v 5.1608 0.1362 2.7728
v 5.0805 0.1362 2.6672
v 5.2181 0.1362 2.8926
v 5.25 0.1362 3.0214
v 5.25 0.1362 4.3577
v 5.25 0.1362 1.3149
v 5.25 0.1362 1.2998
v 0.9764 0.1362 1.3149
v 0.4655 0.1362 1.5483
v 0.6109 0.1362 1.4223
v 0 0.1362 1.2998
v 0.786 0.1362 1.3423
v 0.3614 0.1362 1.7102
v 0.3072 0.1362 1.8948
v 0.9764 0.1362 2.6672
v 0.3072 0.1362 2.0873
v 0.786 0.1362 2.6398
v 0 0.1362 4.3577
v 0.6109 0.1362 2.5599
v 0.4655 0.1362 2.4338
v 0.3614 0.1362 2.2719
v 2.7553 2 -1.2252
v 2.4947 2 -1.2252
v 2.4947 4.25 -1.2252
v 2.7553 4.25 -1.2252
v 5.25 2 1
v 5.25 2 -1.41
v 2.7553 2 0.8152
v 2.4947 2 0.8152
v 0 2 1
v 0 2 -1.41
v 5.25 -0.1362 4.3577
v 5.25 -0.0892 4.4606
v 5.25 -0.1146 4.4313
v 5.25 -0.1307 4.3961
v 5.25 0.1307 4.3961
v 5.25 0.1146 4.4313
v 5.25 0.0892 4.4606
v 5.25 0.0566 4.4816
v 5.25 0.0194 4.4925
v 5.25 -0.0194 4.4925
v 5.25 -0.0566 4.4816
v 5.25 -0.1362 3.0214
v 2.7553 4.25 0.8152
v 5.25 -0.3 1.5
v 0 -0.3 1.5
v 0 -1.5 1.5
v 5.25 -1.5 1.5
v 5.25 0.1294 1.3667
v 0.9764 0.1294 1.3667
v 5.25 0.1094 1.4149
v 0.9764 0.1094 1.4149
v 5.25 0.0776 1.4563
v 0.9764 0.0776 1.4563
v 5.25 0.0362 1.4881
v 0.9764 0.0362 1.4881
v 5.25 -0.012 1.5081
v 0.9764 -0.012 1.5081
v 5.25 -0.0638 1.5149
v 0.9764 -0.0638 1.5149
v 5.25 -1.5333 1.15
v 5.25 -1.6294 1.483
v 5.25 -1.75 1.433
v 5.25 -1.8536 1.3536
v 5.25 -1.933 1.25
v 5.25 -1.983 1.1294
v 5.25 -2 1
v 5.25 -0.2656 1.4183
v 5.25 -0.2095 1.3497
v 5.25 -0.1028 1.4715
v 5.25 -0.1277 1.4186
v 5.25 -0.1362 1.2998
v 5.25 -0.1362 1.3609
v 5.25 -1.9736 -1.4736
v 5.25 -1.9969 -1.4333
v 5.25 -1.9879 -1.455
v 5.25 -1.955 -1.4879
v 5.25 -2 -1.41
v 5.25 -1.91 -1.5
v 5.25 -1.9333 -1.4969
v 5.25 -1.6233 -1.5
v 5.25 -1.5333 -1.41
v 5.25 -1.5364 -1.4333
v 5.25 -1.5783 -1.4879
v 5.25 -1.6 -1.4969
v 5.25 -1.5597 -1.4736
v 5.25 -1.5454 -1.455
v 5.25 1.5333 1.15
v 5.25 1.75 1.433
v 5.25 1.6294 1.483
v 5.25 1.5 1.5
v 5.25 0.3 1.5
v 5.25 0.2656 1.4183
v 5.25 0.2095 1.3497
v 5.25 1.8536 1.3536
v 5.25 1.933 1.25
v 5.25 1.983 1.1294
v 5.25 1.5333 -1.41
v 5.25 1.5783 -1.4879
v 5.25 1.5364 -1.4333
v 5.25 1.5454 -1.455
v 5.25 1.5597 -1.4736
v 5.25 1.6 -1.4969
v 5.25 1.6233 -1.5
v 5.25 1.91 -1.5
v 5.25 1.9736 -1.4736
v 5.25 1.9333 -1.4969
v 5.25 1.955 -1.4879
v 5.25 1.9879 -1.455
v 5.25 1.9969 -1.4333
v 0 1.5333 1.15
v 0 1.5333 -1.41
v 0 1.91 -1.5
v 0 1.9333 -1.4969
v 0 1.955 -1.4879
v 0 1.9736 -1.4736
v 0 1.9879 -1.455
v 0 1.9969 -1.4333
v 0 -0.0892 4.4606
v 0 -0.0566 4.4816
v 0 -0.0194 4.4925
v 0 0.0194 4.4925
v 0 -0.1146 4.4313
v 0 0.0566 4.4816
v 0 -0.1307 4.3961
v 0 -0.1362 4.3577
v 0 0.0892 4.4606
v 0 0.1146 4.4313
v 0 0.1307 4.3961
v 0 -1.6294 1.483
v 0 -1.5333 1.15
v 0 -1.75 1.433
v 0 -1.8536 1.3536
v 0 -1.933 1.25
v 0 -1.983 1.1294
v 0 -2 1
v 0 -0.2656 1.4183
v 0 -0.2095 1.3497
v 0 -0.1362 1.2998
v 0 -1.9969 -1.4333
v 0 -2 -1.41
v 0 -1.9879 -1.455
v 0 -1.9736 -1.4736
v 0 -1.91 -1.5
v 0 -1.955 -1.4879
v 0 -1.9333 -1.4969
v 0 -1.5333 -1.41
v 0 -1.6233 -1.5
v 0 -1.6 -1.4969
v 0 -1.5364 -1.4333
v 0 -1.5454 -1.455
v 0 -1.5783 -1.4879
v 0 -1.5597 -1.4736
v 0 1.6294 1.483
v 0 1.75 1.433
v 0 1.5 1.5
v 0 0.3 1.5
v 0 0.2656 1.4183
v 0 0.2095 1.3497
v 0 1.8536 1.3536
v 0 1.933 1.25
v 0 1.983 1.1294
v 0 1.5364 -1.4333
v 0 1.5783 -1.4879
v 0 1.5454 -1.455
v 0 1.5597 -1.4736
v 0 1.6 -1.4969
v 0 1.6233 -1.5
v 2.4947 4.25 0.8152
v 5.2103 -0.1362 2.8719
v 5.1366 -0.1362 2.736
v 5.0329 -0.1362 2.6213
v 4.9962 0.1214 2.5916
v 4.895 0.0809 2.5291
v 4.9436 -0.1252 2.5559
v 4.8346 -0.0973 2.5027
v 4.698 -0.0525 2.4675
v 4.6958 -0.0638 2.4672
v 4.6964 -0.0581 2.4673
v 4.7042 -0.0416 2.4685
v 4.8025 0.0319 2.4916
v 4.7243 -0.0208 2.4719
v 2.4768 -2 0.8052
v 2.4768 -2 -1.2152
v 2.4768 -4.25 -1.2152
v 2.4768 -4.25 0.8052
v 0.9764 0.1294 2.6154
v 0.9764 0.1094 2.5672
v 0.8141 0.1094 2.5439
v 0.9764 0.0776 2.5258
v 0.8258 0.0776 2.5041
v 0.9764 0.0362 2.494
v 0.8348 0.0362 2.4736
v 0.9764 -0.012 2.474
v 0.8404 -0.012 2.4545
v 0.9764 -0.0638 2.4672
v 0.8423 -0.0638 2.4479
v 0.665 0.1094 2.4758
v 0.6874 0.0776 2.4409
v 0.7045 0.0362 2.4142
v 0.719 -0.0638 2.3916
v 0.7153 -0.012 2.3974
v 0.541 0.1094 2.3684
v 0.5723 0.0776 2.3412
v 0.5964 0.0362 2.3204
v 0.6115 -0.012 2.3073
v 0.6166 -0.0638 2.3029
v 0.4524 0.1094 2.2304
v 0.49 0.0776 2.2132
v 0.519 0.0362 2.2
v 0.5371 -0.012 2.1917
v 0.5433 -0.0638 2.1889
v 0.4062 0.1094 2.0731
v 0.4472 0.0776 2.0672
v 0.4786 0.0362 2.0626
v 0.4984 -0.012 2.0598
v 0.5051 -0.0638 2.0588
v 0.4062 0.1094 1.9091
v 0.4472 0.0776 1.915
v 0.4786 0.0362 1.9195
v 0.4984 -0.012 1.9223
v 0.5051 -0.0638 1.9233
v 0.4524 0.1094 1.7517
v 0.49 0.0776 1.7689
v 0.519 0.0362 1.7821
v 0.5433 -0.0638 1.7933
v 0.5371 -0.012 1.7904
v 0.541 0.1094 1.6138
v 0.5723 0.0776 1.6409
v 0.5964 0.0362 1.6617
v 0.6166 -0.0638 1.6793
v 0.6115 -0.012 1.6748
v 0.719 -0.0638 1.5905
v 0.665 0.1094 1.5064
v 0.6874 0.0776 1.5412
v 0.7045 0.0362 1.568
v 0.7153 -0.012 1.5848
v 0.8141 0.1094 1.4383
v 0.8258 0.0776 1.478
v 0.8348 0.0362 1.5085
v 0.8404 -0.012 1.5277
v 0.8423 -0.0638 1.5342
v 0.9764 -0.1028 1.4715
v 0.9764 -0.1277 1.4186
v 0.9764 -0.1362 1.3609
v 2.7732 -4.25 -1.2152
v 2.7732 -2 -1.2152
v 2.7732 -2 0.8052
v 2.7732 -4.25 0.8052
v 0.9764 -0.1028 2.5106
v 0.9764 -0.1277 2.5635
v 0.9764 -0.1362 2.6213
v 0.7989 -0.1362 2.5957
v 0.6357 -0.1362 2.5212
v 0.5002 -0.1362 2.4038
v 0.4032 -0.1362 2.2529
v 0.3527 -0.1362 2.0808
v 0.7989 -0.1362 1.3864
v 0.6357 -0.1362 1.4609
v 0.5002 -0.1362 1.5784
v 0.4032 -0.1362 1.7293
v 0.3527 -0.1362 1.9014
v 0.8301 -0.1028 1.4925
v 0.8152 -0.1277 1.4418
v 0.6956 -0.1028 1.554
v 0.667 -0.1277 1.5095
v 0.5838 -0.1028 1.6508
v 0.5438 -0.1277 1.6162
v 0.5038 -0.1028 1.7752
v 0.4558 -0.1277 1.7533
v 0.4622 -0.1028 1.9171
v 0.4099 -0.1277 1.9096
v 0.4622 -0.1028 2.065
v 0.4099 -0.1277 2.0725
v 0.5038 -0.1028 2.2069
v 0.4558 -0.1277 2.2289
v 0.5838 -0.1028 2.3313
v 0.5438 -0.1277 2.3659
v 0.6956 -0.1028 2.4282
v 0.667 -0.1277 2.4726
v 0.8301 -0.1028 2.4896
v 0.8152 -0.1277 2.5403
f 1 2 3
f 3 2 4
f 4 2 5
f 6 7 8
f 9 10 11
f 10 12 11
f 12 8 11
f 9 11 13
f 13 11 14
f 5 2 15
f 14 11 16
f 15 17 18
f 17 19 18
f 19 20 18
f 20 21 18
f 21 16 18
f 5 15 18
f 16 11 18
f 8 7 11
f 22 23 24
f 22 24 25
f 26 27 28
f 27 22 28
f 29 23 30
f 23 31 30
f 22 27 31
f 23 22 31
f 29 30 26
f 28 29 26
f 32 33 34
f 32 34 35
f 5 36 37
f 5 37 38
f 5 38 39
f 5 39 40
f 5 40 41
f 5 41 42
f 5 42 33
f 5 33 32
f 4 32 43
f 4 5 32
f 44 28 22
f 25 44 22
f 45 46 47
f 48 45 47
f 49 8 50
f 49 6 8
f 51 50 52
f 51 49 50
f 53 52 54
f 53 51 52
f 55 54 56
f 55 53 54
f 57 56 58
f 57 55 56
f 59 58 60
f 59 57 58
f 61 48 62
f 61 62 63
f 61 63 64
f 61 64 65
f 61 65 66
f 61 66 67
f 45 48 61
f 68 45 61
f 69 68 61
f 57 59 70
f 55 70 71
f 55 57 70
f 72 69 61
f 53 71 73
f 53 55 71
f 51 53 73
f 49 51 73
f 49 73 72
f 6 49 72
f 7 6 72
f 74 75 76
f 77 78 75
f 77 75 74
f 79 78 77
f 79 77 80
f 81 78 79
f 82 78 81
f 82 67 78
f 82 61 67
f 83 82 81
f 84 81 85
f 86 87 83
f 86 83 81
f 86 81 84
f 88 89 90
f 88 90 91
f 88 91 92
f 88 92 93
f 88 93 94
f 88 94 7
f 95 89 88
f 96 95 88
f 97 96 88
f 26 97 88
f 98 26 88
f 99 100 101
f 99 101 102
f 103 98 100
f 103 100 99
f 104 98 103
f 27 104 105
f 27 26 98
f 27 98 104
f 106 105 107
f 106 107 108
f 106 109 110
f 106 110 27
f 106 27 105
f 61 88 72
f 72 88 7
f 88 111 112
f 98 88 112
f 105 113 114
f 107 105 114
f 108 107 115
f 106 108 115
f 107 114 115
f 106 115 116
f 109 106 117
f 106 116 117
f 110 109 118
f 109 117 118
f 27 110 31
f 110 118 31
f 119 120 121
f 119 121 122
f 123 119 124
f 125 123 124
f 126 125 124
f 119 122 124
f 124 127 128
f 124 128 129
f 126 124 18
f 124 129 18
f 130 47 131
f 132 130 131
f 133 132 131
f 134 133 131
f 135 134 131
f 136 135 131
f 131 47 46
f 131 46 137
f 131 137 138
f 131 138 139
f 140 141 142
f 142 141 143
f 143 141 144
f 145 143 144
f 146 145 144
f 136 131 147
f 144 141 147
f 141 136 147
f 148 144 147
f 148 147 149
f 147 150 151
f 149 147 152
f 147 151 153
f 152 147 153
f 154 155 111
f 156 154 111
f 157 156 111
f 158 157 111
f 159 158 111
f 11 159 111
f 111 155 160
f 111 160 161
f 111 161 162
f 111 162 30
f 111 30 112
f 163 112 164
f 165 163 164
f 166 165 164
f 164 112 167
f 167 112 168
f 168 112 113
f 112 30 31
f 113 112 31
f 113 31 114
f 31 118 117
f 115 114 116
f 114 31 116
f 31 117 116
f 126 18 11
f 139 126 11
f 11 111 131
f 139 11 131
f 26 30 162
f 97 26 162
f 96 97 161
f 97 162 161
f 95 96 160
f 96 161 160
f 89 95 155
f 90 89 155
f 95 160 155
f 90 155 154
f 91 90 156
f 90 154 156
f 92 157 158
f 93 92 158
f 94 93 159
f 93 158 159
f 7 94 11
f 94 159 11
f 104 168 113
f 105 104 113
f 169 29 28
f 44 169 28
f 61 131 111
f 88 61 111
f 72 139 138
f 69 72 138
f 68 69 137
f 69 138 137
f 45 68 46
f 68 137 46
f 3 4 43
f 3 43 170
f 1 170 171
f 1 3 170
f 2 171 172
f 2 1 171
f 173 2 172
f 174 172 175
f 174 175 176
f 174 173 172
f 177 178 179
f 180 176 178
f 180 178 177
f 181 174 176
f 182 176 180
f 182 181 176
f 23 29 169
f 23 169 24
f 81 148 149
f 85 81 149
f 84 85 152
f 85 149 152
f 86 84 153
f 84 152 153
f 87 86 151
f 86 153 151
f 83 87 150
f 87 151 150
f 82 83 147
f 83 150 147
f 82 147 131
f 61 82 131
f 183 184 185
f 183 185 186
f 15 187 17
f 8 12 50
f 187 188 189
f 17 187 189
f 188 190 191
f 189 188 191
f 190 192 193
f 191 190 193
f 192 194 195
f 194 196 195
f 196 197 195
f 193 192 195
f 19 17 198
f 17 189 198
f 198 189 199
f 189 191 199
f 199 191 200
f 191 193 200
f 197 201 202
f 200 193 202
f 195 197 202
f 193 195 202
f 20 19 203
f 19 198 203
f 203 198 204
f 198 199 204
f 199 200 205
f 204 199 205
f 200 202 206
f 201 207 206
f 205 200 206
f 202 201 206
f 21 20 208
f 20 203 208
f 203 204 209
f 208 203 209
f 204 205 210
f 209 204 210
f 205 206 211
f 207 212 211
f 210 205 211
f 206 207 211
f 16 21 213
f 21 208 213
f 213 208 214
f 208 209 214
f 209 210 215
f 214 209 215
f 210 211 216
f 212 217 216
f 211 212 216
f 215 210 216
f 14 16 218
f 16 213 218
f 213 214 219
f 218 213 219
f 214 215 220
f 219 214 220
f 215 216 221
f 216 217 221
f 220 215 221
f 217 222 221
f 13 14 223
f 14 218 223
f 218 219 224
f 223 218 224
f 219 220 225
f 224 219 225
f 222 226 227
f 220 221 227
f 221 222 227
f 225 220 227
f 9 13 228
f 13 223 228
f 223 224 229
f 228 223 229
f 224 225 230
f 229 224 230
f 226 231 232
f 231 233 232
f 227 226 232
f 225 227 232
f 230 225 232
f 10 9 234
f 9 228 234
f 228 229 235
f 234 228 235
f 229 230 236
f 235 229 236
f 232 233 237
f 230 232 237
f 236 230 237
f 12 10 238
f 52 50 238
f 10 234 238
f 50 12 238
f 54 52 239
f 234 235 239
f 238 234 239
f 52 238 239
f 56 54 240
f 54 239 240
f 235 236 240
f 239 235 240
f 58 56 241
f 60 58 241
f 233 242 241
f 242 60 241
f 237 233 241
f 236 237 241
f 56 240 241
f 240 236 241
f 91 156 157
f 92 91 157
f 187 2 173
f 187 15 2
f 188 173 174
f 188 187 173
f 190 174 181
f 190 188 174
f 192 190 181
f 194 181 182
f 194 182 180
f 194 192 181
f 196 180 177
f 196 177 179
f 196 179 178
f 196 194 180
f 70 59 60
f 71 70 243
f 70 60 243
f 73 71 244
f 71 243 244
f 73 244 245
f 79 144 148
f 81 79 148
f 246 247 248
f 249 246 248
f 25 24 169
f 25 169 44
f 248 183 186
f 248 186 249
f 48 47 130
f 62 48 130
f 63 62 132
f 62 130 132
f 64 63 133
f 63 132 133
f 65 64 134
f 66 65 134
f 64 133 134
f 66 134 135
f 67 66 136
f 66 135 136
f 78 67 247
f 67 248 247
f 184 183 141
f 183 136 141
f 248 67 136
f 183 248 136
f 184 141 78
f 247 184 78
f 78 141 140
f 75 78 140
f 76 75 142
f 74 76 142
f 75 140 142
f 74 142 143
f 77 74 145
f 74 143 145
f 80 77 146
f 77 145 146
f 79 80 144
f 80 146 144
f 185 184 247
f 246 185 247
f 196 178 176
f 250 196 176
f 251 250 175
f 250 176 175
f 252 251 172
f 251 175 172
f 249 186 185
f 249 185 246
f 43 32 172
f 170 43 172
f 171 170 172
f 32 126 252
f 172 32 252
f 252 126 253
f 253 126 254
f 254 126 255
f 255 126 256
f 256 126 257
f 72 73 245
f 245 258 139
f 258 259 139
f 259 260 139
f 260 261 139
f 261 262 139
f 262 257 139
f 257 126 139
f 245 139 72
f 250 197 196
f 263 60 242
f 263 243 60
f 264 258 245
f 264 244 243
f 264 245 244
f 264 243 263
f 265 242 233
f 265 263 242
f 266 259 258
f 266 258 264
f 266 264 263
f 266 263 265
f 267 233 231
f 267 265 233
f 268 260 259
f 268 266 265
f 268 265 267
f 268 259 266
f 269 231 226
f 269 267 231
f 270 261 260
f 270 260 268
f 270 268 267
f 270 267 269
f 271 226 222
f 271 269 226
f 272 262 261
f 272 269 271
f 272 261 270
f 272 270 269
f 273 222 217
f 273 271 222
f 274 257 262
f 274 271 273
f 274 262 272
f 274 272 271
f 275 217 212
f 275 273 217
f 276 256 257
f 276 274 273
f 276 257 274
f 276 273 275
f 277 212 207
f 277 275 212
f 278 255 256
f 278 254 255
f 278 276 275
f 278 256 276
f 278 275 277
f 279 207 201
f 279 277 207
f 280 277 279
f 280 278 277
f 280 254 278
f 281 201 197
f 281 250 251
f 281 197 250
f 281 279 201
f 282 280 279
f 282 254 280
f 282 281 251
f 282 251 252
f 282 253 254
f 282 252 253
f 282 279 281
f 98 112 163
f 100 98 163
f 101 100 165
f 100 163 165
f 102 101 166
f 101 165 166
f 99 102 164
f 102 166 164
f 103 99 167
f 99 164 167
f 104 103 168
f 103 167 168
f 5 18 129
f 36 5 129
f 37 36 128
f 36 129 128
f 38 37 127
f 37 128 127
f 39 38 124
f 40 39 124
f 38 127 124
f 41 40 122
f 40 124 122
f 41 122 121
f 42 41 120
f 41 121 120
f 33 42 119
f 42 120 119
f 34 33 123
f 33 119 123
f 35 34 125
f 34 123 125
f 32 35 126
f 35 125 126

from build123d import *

# Parameters (mm, degrees)
RESSALTO_EXTRUS_O1_DEPTH = 5.25
CORTE_EXTRUS_O1_DEPTH    = 5.25
CORTE_EXTRUS_O2_DEPTH    = 5.25
FILETE1_R                = 0.2
FILETE2_R                = 0.2
ESBO_O5_W                = 0.260533882
ESBO_O5_H                = 2.040360402
RESSALTO_EXTRUS_O2_DEPTH = 2.25
ESBO_O6_W                = 0.29646959
ESBO_O6_H                = 2.02037459
RESSALTO_EXTRUS_O3_DEPTH = 2.25


with BuildPart() as part:
    # Esboço1 → Ressalto-extrusão1 (new body)
    with BuildSketch(Plane(origin=(0, 0, 0), x_dir=(0, 0, -1), z_dir=(1, 0, 0))):
        with BuildLine():
            Line((1.15, 1.533333333), (1.41, 1.533333333))
            ThreePointArc((1.41, 1.533333333), (1.47363961, 1.559693723), (1.5, 1.623333333))
            Line((1.5, 1.623333333), (1.5, 1.91))
            ThreePointArc((1.5, 1.91), (1.47363961, 1.97363961), (1.41, 2))
            Line((1.41, 2), (-1, 2))
            ThreePointArc((-1, 2), (-1.353553391, 1.853553391), (-1.5, 1.5))
            Line((-1.5, 1.5), (-1.5, 0.3))
            ThreePointArc((-1.5, 0.3), (-1.382013537, 0.239983106), (-1.299811944, 0.136225065))
            Line((-1.299811944, 0.136225065), (-4.357674279, 0.136225065))
            ThreePointArc((-4.357674279, 0.136225065), (-4.493899344, 0), (-4.357674279, -0.136225065))
            Line((-4.357674279, -0.136225065), (-1.299811944, -0.136225065))
            ThreePointArc((-1.299811944, -0.136225065), (-1.382013537, -0.239983106), (-1.5, -0.3))
            Line((-1.5, -0.3), (-1.5, -1.5))
            ThreePointArc((-1.5, -1.5), (-1.353553391, -1.853553391), (-1, -2))
            Line((-1, -2), (1.41, -2))
            ThreePointArc((1.41, -2), (1.47363961, -1.97363961), (1.5, -1.91))
            Line((1.5, -1.91), (1.5, -1.623333333))
            ThreePointArc((1.5, -1.623333333), (1.47363961, -1.559693723), (1.41, -1.533333333))
            Line((1.41, -1.533333333), (1.15, -1.533333333))
            Line((1.15, -1.533333333), (-1.15, -1.533333333))
            Line((-1.15, -1.533333333), (-1.15, 1.533333333))
            Line((-1.15, 1.533333333), (1.15, 1.533333333))
        make_face()
    extrude(amount=RESSALTO_EXTRUS_O1_DEPTH)

    # Esboço3 → Corte-extrusão1 (cut)
    with BuildSketch(Plane(origin=(0, 0.136225065, 0), x_dir=(1, 0, 0), z_dir=(0, 1, 0))):
        with BuildLine():
            Line((0.9764494, -1.514917526), (7.89407317, -1.514917526))
            ThreePointArc((7.89407317, -1.514917526), (8.3702213, -1.991065656), (7.89407317, -2.467213785))
            Line((7.89407317, -2.467213785), (0.9764494, -2.467213785))
            ThreePointArc((0.9764494, -2.467213785), (0.500301271, -1.991065656), (0.9764494, -1.514917526))
        make_face()
    extrude(amount=-CORTE_EXTRUS_O1_DEPTH, mode=Mode.SUBTRACT)

    # Esboço4 → Corte-extrusão2 (cut)
    with BuildSketch(Plane(origin=(0, 0.136225065, 0), x_dir=(1, 0, 0), z_dir=(0, 1, 0))):
        with BuildLine():
            Line((4.695795168, -2.467213785), (4.884457634, -1.937162094))
            Line((4.884457634, -1.937162094), (6.007448506, -2.098872779))
            Line((6.007448506, -2.098872779), (6.375789512, -3.266783286))
            Line((6.375789512, -3.266783286), (5.25, -3.203895797))
            ThreePointArc((5.25, -3.203895797), (5.125469424, -2.720775212), (4.695795168, -2.467213785))
        make_face()
    extrude(amount=-CORTE_EXTRUS_O2_DEPTH, mode=Mode.SUBTRACT)

    # Filete1
    filete1_edges = [part.edges().sort_by_distance(p)[0] for p in [
        (2.836122284, 0.136225065, 2.467213785),
        (3.1132247, 0.136225065, 1.514917526),
        (0.500301271, 0.136225065, 1.991065656),
    ]]
    fillet(filete1_edges, radius=FILETE1_R)

    # Filete2
    # the kernel refuses this fillet: 0.2 mm, written as the material it takes off along each edge
    with BuildSketch(Plane(origin=(5.080917151, -0.136225065, 2.467213785), x_dir=(0, 0, 1), z_dir=(-1, 0, 0))) as filete2_piece_1:
        with BuildLine():
            CenterArc((0.154048793, 0.2), FILETE2_R, 219.624198081, 50.375801919)
            Line((0, 0.07245013), (-0.003080976, 0.069899133))
            ThreePointArc((-0.003080976, 0.069899133), (-0.004, 0.036225065), (-0.004, 0))
            Line((-0.004, 0), (0, -0.004))
            Line((0, -0.004), (0.154048793, -0.004))
            Line((0.154048793, -0.004), (0.154048793, 0))
        make_face()
    extrude(amount=4.104467751, mode=Mode.SUBTRACT)
    with BuildSketch(Plane(origin=(0.9764494, -0.136225065, 1.991065656), x_dir=(0, 0, -1), z_dir=(1, 0, 0))) as filete2_piece_2:
        with BuildLine():
            CenterArc((0.630196923, 0.2), FILETE2_R, 219.624198081, 50.375801919)
            Line((0.47614813, 0.07245013), (0.473067154, 0.069899133))
            ThreePointArc((0.473067154, 0.069899133), (0.47214813, 0.036225065), (0.47214813, 0))
            Line((0.47214813, 0), (0.47614813, -0.004))
            Line((0.47614813, -0.004), (0.630196923, -0.004))
            Line((0.630196923, -0.004), (0.630196923, 0))
        make_face()
    revolve(axis=Axis((0.9764494, -0.136225065, 1.991065656), (0, 1, 0)), revolution_arc=180, mode=Mode.SUBTRACT)
    with BuildSketch(Plane(origin=(0.9764494, -0.136225065, 1.514917526), x_dir=(0, 1, 0), z_dir=(1, 0, 0))) as filete2_piece_3:
        with BuildLine():
            CenterArc((0.2, -0.154048793), FILETE2_R, 129.624198081, 50.375801919)
            Line((0, -0.154048793), (-0.004, -0.154048793))
            Line((-0.004, -0.154048793), (-0.004, 0))
            Line((-0.004, 0), (0, 0.004))
            ThreePointArc((0, 0.004), (0.036225065, 0.004), (0.069899133, 0.003080976))
            Line((0.069899133, 0.003080976), (0.07245013, 0))
        make_face()
    extrude(amount=4.658672583, mode=Mode.SUBTRACT)

    # Esboço5 → Ressalto-extrusão2 (add)
    with BuildSketch(Plane(origin=(0, 2, 0), x_dir=(1, 0, 0), z_dir=(0, 1, 0))):
        with Locations((2.625, 0.205)):
            Rectangle(ESBO_O5_W, ESBO_O5_H)
    extrude(amount=RESSALTO_EXTRUS_O2_DEPTH)

    # Esboço6 → Ressalto-extrusão3 (add)
    with BuildSketch(Plane.XZ.offset(2)):
        with Locations((2.625, -0.205)):
            Rectangle(ESBO_O6_W, ESBO_O6_H)
    extrude(amount=RESSALTO_EXTRUS_O3_DEPTH)


solid = part.part
